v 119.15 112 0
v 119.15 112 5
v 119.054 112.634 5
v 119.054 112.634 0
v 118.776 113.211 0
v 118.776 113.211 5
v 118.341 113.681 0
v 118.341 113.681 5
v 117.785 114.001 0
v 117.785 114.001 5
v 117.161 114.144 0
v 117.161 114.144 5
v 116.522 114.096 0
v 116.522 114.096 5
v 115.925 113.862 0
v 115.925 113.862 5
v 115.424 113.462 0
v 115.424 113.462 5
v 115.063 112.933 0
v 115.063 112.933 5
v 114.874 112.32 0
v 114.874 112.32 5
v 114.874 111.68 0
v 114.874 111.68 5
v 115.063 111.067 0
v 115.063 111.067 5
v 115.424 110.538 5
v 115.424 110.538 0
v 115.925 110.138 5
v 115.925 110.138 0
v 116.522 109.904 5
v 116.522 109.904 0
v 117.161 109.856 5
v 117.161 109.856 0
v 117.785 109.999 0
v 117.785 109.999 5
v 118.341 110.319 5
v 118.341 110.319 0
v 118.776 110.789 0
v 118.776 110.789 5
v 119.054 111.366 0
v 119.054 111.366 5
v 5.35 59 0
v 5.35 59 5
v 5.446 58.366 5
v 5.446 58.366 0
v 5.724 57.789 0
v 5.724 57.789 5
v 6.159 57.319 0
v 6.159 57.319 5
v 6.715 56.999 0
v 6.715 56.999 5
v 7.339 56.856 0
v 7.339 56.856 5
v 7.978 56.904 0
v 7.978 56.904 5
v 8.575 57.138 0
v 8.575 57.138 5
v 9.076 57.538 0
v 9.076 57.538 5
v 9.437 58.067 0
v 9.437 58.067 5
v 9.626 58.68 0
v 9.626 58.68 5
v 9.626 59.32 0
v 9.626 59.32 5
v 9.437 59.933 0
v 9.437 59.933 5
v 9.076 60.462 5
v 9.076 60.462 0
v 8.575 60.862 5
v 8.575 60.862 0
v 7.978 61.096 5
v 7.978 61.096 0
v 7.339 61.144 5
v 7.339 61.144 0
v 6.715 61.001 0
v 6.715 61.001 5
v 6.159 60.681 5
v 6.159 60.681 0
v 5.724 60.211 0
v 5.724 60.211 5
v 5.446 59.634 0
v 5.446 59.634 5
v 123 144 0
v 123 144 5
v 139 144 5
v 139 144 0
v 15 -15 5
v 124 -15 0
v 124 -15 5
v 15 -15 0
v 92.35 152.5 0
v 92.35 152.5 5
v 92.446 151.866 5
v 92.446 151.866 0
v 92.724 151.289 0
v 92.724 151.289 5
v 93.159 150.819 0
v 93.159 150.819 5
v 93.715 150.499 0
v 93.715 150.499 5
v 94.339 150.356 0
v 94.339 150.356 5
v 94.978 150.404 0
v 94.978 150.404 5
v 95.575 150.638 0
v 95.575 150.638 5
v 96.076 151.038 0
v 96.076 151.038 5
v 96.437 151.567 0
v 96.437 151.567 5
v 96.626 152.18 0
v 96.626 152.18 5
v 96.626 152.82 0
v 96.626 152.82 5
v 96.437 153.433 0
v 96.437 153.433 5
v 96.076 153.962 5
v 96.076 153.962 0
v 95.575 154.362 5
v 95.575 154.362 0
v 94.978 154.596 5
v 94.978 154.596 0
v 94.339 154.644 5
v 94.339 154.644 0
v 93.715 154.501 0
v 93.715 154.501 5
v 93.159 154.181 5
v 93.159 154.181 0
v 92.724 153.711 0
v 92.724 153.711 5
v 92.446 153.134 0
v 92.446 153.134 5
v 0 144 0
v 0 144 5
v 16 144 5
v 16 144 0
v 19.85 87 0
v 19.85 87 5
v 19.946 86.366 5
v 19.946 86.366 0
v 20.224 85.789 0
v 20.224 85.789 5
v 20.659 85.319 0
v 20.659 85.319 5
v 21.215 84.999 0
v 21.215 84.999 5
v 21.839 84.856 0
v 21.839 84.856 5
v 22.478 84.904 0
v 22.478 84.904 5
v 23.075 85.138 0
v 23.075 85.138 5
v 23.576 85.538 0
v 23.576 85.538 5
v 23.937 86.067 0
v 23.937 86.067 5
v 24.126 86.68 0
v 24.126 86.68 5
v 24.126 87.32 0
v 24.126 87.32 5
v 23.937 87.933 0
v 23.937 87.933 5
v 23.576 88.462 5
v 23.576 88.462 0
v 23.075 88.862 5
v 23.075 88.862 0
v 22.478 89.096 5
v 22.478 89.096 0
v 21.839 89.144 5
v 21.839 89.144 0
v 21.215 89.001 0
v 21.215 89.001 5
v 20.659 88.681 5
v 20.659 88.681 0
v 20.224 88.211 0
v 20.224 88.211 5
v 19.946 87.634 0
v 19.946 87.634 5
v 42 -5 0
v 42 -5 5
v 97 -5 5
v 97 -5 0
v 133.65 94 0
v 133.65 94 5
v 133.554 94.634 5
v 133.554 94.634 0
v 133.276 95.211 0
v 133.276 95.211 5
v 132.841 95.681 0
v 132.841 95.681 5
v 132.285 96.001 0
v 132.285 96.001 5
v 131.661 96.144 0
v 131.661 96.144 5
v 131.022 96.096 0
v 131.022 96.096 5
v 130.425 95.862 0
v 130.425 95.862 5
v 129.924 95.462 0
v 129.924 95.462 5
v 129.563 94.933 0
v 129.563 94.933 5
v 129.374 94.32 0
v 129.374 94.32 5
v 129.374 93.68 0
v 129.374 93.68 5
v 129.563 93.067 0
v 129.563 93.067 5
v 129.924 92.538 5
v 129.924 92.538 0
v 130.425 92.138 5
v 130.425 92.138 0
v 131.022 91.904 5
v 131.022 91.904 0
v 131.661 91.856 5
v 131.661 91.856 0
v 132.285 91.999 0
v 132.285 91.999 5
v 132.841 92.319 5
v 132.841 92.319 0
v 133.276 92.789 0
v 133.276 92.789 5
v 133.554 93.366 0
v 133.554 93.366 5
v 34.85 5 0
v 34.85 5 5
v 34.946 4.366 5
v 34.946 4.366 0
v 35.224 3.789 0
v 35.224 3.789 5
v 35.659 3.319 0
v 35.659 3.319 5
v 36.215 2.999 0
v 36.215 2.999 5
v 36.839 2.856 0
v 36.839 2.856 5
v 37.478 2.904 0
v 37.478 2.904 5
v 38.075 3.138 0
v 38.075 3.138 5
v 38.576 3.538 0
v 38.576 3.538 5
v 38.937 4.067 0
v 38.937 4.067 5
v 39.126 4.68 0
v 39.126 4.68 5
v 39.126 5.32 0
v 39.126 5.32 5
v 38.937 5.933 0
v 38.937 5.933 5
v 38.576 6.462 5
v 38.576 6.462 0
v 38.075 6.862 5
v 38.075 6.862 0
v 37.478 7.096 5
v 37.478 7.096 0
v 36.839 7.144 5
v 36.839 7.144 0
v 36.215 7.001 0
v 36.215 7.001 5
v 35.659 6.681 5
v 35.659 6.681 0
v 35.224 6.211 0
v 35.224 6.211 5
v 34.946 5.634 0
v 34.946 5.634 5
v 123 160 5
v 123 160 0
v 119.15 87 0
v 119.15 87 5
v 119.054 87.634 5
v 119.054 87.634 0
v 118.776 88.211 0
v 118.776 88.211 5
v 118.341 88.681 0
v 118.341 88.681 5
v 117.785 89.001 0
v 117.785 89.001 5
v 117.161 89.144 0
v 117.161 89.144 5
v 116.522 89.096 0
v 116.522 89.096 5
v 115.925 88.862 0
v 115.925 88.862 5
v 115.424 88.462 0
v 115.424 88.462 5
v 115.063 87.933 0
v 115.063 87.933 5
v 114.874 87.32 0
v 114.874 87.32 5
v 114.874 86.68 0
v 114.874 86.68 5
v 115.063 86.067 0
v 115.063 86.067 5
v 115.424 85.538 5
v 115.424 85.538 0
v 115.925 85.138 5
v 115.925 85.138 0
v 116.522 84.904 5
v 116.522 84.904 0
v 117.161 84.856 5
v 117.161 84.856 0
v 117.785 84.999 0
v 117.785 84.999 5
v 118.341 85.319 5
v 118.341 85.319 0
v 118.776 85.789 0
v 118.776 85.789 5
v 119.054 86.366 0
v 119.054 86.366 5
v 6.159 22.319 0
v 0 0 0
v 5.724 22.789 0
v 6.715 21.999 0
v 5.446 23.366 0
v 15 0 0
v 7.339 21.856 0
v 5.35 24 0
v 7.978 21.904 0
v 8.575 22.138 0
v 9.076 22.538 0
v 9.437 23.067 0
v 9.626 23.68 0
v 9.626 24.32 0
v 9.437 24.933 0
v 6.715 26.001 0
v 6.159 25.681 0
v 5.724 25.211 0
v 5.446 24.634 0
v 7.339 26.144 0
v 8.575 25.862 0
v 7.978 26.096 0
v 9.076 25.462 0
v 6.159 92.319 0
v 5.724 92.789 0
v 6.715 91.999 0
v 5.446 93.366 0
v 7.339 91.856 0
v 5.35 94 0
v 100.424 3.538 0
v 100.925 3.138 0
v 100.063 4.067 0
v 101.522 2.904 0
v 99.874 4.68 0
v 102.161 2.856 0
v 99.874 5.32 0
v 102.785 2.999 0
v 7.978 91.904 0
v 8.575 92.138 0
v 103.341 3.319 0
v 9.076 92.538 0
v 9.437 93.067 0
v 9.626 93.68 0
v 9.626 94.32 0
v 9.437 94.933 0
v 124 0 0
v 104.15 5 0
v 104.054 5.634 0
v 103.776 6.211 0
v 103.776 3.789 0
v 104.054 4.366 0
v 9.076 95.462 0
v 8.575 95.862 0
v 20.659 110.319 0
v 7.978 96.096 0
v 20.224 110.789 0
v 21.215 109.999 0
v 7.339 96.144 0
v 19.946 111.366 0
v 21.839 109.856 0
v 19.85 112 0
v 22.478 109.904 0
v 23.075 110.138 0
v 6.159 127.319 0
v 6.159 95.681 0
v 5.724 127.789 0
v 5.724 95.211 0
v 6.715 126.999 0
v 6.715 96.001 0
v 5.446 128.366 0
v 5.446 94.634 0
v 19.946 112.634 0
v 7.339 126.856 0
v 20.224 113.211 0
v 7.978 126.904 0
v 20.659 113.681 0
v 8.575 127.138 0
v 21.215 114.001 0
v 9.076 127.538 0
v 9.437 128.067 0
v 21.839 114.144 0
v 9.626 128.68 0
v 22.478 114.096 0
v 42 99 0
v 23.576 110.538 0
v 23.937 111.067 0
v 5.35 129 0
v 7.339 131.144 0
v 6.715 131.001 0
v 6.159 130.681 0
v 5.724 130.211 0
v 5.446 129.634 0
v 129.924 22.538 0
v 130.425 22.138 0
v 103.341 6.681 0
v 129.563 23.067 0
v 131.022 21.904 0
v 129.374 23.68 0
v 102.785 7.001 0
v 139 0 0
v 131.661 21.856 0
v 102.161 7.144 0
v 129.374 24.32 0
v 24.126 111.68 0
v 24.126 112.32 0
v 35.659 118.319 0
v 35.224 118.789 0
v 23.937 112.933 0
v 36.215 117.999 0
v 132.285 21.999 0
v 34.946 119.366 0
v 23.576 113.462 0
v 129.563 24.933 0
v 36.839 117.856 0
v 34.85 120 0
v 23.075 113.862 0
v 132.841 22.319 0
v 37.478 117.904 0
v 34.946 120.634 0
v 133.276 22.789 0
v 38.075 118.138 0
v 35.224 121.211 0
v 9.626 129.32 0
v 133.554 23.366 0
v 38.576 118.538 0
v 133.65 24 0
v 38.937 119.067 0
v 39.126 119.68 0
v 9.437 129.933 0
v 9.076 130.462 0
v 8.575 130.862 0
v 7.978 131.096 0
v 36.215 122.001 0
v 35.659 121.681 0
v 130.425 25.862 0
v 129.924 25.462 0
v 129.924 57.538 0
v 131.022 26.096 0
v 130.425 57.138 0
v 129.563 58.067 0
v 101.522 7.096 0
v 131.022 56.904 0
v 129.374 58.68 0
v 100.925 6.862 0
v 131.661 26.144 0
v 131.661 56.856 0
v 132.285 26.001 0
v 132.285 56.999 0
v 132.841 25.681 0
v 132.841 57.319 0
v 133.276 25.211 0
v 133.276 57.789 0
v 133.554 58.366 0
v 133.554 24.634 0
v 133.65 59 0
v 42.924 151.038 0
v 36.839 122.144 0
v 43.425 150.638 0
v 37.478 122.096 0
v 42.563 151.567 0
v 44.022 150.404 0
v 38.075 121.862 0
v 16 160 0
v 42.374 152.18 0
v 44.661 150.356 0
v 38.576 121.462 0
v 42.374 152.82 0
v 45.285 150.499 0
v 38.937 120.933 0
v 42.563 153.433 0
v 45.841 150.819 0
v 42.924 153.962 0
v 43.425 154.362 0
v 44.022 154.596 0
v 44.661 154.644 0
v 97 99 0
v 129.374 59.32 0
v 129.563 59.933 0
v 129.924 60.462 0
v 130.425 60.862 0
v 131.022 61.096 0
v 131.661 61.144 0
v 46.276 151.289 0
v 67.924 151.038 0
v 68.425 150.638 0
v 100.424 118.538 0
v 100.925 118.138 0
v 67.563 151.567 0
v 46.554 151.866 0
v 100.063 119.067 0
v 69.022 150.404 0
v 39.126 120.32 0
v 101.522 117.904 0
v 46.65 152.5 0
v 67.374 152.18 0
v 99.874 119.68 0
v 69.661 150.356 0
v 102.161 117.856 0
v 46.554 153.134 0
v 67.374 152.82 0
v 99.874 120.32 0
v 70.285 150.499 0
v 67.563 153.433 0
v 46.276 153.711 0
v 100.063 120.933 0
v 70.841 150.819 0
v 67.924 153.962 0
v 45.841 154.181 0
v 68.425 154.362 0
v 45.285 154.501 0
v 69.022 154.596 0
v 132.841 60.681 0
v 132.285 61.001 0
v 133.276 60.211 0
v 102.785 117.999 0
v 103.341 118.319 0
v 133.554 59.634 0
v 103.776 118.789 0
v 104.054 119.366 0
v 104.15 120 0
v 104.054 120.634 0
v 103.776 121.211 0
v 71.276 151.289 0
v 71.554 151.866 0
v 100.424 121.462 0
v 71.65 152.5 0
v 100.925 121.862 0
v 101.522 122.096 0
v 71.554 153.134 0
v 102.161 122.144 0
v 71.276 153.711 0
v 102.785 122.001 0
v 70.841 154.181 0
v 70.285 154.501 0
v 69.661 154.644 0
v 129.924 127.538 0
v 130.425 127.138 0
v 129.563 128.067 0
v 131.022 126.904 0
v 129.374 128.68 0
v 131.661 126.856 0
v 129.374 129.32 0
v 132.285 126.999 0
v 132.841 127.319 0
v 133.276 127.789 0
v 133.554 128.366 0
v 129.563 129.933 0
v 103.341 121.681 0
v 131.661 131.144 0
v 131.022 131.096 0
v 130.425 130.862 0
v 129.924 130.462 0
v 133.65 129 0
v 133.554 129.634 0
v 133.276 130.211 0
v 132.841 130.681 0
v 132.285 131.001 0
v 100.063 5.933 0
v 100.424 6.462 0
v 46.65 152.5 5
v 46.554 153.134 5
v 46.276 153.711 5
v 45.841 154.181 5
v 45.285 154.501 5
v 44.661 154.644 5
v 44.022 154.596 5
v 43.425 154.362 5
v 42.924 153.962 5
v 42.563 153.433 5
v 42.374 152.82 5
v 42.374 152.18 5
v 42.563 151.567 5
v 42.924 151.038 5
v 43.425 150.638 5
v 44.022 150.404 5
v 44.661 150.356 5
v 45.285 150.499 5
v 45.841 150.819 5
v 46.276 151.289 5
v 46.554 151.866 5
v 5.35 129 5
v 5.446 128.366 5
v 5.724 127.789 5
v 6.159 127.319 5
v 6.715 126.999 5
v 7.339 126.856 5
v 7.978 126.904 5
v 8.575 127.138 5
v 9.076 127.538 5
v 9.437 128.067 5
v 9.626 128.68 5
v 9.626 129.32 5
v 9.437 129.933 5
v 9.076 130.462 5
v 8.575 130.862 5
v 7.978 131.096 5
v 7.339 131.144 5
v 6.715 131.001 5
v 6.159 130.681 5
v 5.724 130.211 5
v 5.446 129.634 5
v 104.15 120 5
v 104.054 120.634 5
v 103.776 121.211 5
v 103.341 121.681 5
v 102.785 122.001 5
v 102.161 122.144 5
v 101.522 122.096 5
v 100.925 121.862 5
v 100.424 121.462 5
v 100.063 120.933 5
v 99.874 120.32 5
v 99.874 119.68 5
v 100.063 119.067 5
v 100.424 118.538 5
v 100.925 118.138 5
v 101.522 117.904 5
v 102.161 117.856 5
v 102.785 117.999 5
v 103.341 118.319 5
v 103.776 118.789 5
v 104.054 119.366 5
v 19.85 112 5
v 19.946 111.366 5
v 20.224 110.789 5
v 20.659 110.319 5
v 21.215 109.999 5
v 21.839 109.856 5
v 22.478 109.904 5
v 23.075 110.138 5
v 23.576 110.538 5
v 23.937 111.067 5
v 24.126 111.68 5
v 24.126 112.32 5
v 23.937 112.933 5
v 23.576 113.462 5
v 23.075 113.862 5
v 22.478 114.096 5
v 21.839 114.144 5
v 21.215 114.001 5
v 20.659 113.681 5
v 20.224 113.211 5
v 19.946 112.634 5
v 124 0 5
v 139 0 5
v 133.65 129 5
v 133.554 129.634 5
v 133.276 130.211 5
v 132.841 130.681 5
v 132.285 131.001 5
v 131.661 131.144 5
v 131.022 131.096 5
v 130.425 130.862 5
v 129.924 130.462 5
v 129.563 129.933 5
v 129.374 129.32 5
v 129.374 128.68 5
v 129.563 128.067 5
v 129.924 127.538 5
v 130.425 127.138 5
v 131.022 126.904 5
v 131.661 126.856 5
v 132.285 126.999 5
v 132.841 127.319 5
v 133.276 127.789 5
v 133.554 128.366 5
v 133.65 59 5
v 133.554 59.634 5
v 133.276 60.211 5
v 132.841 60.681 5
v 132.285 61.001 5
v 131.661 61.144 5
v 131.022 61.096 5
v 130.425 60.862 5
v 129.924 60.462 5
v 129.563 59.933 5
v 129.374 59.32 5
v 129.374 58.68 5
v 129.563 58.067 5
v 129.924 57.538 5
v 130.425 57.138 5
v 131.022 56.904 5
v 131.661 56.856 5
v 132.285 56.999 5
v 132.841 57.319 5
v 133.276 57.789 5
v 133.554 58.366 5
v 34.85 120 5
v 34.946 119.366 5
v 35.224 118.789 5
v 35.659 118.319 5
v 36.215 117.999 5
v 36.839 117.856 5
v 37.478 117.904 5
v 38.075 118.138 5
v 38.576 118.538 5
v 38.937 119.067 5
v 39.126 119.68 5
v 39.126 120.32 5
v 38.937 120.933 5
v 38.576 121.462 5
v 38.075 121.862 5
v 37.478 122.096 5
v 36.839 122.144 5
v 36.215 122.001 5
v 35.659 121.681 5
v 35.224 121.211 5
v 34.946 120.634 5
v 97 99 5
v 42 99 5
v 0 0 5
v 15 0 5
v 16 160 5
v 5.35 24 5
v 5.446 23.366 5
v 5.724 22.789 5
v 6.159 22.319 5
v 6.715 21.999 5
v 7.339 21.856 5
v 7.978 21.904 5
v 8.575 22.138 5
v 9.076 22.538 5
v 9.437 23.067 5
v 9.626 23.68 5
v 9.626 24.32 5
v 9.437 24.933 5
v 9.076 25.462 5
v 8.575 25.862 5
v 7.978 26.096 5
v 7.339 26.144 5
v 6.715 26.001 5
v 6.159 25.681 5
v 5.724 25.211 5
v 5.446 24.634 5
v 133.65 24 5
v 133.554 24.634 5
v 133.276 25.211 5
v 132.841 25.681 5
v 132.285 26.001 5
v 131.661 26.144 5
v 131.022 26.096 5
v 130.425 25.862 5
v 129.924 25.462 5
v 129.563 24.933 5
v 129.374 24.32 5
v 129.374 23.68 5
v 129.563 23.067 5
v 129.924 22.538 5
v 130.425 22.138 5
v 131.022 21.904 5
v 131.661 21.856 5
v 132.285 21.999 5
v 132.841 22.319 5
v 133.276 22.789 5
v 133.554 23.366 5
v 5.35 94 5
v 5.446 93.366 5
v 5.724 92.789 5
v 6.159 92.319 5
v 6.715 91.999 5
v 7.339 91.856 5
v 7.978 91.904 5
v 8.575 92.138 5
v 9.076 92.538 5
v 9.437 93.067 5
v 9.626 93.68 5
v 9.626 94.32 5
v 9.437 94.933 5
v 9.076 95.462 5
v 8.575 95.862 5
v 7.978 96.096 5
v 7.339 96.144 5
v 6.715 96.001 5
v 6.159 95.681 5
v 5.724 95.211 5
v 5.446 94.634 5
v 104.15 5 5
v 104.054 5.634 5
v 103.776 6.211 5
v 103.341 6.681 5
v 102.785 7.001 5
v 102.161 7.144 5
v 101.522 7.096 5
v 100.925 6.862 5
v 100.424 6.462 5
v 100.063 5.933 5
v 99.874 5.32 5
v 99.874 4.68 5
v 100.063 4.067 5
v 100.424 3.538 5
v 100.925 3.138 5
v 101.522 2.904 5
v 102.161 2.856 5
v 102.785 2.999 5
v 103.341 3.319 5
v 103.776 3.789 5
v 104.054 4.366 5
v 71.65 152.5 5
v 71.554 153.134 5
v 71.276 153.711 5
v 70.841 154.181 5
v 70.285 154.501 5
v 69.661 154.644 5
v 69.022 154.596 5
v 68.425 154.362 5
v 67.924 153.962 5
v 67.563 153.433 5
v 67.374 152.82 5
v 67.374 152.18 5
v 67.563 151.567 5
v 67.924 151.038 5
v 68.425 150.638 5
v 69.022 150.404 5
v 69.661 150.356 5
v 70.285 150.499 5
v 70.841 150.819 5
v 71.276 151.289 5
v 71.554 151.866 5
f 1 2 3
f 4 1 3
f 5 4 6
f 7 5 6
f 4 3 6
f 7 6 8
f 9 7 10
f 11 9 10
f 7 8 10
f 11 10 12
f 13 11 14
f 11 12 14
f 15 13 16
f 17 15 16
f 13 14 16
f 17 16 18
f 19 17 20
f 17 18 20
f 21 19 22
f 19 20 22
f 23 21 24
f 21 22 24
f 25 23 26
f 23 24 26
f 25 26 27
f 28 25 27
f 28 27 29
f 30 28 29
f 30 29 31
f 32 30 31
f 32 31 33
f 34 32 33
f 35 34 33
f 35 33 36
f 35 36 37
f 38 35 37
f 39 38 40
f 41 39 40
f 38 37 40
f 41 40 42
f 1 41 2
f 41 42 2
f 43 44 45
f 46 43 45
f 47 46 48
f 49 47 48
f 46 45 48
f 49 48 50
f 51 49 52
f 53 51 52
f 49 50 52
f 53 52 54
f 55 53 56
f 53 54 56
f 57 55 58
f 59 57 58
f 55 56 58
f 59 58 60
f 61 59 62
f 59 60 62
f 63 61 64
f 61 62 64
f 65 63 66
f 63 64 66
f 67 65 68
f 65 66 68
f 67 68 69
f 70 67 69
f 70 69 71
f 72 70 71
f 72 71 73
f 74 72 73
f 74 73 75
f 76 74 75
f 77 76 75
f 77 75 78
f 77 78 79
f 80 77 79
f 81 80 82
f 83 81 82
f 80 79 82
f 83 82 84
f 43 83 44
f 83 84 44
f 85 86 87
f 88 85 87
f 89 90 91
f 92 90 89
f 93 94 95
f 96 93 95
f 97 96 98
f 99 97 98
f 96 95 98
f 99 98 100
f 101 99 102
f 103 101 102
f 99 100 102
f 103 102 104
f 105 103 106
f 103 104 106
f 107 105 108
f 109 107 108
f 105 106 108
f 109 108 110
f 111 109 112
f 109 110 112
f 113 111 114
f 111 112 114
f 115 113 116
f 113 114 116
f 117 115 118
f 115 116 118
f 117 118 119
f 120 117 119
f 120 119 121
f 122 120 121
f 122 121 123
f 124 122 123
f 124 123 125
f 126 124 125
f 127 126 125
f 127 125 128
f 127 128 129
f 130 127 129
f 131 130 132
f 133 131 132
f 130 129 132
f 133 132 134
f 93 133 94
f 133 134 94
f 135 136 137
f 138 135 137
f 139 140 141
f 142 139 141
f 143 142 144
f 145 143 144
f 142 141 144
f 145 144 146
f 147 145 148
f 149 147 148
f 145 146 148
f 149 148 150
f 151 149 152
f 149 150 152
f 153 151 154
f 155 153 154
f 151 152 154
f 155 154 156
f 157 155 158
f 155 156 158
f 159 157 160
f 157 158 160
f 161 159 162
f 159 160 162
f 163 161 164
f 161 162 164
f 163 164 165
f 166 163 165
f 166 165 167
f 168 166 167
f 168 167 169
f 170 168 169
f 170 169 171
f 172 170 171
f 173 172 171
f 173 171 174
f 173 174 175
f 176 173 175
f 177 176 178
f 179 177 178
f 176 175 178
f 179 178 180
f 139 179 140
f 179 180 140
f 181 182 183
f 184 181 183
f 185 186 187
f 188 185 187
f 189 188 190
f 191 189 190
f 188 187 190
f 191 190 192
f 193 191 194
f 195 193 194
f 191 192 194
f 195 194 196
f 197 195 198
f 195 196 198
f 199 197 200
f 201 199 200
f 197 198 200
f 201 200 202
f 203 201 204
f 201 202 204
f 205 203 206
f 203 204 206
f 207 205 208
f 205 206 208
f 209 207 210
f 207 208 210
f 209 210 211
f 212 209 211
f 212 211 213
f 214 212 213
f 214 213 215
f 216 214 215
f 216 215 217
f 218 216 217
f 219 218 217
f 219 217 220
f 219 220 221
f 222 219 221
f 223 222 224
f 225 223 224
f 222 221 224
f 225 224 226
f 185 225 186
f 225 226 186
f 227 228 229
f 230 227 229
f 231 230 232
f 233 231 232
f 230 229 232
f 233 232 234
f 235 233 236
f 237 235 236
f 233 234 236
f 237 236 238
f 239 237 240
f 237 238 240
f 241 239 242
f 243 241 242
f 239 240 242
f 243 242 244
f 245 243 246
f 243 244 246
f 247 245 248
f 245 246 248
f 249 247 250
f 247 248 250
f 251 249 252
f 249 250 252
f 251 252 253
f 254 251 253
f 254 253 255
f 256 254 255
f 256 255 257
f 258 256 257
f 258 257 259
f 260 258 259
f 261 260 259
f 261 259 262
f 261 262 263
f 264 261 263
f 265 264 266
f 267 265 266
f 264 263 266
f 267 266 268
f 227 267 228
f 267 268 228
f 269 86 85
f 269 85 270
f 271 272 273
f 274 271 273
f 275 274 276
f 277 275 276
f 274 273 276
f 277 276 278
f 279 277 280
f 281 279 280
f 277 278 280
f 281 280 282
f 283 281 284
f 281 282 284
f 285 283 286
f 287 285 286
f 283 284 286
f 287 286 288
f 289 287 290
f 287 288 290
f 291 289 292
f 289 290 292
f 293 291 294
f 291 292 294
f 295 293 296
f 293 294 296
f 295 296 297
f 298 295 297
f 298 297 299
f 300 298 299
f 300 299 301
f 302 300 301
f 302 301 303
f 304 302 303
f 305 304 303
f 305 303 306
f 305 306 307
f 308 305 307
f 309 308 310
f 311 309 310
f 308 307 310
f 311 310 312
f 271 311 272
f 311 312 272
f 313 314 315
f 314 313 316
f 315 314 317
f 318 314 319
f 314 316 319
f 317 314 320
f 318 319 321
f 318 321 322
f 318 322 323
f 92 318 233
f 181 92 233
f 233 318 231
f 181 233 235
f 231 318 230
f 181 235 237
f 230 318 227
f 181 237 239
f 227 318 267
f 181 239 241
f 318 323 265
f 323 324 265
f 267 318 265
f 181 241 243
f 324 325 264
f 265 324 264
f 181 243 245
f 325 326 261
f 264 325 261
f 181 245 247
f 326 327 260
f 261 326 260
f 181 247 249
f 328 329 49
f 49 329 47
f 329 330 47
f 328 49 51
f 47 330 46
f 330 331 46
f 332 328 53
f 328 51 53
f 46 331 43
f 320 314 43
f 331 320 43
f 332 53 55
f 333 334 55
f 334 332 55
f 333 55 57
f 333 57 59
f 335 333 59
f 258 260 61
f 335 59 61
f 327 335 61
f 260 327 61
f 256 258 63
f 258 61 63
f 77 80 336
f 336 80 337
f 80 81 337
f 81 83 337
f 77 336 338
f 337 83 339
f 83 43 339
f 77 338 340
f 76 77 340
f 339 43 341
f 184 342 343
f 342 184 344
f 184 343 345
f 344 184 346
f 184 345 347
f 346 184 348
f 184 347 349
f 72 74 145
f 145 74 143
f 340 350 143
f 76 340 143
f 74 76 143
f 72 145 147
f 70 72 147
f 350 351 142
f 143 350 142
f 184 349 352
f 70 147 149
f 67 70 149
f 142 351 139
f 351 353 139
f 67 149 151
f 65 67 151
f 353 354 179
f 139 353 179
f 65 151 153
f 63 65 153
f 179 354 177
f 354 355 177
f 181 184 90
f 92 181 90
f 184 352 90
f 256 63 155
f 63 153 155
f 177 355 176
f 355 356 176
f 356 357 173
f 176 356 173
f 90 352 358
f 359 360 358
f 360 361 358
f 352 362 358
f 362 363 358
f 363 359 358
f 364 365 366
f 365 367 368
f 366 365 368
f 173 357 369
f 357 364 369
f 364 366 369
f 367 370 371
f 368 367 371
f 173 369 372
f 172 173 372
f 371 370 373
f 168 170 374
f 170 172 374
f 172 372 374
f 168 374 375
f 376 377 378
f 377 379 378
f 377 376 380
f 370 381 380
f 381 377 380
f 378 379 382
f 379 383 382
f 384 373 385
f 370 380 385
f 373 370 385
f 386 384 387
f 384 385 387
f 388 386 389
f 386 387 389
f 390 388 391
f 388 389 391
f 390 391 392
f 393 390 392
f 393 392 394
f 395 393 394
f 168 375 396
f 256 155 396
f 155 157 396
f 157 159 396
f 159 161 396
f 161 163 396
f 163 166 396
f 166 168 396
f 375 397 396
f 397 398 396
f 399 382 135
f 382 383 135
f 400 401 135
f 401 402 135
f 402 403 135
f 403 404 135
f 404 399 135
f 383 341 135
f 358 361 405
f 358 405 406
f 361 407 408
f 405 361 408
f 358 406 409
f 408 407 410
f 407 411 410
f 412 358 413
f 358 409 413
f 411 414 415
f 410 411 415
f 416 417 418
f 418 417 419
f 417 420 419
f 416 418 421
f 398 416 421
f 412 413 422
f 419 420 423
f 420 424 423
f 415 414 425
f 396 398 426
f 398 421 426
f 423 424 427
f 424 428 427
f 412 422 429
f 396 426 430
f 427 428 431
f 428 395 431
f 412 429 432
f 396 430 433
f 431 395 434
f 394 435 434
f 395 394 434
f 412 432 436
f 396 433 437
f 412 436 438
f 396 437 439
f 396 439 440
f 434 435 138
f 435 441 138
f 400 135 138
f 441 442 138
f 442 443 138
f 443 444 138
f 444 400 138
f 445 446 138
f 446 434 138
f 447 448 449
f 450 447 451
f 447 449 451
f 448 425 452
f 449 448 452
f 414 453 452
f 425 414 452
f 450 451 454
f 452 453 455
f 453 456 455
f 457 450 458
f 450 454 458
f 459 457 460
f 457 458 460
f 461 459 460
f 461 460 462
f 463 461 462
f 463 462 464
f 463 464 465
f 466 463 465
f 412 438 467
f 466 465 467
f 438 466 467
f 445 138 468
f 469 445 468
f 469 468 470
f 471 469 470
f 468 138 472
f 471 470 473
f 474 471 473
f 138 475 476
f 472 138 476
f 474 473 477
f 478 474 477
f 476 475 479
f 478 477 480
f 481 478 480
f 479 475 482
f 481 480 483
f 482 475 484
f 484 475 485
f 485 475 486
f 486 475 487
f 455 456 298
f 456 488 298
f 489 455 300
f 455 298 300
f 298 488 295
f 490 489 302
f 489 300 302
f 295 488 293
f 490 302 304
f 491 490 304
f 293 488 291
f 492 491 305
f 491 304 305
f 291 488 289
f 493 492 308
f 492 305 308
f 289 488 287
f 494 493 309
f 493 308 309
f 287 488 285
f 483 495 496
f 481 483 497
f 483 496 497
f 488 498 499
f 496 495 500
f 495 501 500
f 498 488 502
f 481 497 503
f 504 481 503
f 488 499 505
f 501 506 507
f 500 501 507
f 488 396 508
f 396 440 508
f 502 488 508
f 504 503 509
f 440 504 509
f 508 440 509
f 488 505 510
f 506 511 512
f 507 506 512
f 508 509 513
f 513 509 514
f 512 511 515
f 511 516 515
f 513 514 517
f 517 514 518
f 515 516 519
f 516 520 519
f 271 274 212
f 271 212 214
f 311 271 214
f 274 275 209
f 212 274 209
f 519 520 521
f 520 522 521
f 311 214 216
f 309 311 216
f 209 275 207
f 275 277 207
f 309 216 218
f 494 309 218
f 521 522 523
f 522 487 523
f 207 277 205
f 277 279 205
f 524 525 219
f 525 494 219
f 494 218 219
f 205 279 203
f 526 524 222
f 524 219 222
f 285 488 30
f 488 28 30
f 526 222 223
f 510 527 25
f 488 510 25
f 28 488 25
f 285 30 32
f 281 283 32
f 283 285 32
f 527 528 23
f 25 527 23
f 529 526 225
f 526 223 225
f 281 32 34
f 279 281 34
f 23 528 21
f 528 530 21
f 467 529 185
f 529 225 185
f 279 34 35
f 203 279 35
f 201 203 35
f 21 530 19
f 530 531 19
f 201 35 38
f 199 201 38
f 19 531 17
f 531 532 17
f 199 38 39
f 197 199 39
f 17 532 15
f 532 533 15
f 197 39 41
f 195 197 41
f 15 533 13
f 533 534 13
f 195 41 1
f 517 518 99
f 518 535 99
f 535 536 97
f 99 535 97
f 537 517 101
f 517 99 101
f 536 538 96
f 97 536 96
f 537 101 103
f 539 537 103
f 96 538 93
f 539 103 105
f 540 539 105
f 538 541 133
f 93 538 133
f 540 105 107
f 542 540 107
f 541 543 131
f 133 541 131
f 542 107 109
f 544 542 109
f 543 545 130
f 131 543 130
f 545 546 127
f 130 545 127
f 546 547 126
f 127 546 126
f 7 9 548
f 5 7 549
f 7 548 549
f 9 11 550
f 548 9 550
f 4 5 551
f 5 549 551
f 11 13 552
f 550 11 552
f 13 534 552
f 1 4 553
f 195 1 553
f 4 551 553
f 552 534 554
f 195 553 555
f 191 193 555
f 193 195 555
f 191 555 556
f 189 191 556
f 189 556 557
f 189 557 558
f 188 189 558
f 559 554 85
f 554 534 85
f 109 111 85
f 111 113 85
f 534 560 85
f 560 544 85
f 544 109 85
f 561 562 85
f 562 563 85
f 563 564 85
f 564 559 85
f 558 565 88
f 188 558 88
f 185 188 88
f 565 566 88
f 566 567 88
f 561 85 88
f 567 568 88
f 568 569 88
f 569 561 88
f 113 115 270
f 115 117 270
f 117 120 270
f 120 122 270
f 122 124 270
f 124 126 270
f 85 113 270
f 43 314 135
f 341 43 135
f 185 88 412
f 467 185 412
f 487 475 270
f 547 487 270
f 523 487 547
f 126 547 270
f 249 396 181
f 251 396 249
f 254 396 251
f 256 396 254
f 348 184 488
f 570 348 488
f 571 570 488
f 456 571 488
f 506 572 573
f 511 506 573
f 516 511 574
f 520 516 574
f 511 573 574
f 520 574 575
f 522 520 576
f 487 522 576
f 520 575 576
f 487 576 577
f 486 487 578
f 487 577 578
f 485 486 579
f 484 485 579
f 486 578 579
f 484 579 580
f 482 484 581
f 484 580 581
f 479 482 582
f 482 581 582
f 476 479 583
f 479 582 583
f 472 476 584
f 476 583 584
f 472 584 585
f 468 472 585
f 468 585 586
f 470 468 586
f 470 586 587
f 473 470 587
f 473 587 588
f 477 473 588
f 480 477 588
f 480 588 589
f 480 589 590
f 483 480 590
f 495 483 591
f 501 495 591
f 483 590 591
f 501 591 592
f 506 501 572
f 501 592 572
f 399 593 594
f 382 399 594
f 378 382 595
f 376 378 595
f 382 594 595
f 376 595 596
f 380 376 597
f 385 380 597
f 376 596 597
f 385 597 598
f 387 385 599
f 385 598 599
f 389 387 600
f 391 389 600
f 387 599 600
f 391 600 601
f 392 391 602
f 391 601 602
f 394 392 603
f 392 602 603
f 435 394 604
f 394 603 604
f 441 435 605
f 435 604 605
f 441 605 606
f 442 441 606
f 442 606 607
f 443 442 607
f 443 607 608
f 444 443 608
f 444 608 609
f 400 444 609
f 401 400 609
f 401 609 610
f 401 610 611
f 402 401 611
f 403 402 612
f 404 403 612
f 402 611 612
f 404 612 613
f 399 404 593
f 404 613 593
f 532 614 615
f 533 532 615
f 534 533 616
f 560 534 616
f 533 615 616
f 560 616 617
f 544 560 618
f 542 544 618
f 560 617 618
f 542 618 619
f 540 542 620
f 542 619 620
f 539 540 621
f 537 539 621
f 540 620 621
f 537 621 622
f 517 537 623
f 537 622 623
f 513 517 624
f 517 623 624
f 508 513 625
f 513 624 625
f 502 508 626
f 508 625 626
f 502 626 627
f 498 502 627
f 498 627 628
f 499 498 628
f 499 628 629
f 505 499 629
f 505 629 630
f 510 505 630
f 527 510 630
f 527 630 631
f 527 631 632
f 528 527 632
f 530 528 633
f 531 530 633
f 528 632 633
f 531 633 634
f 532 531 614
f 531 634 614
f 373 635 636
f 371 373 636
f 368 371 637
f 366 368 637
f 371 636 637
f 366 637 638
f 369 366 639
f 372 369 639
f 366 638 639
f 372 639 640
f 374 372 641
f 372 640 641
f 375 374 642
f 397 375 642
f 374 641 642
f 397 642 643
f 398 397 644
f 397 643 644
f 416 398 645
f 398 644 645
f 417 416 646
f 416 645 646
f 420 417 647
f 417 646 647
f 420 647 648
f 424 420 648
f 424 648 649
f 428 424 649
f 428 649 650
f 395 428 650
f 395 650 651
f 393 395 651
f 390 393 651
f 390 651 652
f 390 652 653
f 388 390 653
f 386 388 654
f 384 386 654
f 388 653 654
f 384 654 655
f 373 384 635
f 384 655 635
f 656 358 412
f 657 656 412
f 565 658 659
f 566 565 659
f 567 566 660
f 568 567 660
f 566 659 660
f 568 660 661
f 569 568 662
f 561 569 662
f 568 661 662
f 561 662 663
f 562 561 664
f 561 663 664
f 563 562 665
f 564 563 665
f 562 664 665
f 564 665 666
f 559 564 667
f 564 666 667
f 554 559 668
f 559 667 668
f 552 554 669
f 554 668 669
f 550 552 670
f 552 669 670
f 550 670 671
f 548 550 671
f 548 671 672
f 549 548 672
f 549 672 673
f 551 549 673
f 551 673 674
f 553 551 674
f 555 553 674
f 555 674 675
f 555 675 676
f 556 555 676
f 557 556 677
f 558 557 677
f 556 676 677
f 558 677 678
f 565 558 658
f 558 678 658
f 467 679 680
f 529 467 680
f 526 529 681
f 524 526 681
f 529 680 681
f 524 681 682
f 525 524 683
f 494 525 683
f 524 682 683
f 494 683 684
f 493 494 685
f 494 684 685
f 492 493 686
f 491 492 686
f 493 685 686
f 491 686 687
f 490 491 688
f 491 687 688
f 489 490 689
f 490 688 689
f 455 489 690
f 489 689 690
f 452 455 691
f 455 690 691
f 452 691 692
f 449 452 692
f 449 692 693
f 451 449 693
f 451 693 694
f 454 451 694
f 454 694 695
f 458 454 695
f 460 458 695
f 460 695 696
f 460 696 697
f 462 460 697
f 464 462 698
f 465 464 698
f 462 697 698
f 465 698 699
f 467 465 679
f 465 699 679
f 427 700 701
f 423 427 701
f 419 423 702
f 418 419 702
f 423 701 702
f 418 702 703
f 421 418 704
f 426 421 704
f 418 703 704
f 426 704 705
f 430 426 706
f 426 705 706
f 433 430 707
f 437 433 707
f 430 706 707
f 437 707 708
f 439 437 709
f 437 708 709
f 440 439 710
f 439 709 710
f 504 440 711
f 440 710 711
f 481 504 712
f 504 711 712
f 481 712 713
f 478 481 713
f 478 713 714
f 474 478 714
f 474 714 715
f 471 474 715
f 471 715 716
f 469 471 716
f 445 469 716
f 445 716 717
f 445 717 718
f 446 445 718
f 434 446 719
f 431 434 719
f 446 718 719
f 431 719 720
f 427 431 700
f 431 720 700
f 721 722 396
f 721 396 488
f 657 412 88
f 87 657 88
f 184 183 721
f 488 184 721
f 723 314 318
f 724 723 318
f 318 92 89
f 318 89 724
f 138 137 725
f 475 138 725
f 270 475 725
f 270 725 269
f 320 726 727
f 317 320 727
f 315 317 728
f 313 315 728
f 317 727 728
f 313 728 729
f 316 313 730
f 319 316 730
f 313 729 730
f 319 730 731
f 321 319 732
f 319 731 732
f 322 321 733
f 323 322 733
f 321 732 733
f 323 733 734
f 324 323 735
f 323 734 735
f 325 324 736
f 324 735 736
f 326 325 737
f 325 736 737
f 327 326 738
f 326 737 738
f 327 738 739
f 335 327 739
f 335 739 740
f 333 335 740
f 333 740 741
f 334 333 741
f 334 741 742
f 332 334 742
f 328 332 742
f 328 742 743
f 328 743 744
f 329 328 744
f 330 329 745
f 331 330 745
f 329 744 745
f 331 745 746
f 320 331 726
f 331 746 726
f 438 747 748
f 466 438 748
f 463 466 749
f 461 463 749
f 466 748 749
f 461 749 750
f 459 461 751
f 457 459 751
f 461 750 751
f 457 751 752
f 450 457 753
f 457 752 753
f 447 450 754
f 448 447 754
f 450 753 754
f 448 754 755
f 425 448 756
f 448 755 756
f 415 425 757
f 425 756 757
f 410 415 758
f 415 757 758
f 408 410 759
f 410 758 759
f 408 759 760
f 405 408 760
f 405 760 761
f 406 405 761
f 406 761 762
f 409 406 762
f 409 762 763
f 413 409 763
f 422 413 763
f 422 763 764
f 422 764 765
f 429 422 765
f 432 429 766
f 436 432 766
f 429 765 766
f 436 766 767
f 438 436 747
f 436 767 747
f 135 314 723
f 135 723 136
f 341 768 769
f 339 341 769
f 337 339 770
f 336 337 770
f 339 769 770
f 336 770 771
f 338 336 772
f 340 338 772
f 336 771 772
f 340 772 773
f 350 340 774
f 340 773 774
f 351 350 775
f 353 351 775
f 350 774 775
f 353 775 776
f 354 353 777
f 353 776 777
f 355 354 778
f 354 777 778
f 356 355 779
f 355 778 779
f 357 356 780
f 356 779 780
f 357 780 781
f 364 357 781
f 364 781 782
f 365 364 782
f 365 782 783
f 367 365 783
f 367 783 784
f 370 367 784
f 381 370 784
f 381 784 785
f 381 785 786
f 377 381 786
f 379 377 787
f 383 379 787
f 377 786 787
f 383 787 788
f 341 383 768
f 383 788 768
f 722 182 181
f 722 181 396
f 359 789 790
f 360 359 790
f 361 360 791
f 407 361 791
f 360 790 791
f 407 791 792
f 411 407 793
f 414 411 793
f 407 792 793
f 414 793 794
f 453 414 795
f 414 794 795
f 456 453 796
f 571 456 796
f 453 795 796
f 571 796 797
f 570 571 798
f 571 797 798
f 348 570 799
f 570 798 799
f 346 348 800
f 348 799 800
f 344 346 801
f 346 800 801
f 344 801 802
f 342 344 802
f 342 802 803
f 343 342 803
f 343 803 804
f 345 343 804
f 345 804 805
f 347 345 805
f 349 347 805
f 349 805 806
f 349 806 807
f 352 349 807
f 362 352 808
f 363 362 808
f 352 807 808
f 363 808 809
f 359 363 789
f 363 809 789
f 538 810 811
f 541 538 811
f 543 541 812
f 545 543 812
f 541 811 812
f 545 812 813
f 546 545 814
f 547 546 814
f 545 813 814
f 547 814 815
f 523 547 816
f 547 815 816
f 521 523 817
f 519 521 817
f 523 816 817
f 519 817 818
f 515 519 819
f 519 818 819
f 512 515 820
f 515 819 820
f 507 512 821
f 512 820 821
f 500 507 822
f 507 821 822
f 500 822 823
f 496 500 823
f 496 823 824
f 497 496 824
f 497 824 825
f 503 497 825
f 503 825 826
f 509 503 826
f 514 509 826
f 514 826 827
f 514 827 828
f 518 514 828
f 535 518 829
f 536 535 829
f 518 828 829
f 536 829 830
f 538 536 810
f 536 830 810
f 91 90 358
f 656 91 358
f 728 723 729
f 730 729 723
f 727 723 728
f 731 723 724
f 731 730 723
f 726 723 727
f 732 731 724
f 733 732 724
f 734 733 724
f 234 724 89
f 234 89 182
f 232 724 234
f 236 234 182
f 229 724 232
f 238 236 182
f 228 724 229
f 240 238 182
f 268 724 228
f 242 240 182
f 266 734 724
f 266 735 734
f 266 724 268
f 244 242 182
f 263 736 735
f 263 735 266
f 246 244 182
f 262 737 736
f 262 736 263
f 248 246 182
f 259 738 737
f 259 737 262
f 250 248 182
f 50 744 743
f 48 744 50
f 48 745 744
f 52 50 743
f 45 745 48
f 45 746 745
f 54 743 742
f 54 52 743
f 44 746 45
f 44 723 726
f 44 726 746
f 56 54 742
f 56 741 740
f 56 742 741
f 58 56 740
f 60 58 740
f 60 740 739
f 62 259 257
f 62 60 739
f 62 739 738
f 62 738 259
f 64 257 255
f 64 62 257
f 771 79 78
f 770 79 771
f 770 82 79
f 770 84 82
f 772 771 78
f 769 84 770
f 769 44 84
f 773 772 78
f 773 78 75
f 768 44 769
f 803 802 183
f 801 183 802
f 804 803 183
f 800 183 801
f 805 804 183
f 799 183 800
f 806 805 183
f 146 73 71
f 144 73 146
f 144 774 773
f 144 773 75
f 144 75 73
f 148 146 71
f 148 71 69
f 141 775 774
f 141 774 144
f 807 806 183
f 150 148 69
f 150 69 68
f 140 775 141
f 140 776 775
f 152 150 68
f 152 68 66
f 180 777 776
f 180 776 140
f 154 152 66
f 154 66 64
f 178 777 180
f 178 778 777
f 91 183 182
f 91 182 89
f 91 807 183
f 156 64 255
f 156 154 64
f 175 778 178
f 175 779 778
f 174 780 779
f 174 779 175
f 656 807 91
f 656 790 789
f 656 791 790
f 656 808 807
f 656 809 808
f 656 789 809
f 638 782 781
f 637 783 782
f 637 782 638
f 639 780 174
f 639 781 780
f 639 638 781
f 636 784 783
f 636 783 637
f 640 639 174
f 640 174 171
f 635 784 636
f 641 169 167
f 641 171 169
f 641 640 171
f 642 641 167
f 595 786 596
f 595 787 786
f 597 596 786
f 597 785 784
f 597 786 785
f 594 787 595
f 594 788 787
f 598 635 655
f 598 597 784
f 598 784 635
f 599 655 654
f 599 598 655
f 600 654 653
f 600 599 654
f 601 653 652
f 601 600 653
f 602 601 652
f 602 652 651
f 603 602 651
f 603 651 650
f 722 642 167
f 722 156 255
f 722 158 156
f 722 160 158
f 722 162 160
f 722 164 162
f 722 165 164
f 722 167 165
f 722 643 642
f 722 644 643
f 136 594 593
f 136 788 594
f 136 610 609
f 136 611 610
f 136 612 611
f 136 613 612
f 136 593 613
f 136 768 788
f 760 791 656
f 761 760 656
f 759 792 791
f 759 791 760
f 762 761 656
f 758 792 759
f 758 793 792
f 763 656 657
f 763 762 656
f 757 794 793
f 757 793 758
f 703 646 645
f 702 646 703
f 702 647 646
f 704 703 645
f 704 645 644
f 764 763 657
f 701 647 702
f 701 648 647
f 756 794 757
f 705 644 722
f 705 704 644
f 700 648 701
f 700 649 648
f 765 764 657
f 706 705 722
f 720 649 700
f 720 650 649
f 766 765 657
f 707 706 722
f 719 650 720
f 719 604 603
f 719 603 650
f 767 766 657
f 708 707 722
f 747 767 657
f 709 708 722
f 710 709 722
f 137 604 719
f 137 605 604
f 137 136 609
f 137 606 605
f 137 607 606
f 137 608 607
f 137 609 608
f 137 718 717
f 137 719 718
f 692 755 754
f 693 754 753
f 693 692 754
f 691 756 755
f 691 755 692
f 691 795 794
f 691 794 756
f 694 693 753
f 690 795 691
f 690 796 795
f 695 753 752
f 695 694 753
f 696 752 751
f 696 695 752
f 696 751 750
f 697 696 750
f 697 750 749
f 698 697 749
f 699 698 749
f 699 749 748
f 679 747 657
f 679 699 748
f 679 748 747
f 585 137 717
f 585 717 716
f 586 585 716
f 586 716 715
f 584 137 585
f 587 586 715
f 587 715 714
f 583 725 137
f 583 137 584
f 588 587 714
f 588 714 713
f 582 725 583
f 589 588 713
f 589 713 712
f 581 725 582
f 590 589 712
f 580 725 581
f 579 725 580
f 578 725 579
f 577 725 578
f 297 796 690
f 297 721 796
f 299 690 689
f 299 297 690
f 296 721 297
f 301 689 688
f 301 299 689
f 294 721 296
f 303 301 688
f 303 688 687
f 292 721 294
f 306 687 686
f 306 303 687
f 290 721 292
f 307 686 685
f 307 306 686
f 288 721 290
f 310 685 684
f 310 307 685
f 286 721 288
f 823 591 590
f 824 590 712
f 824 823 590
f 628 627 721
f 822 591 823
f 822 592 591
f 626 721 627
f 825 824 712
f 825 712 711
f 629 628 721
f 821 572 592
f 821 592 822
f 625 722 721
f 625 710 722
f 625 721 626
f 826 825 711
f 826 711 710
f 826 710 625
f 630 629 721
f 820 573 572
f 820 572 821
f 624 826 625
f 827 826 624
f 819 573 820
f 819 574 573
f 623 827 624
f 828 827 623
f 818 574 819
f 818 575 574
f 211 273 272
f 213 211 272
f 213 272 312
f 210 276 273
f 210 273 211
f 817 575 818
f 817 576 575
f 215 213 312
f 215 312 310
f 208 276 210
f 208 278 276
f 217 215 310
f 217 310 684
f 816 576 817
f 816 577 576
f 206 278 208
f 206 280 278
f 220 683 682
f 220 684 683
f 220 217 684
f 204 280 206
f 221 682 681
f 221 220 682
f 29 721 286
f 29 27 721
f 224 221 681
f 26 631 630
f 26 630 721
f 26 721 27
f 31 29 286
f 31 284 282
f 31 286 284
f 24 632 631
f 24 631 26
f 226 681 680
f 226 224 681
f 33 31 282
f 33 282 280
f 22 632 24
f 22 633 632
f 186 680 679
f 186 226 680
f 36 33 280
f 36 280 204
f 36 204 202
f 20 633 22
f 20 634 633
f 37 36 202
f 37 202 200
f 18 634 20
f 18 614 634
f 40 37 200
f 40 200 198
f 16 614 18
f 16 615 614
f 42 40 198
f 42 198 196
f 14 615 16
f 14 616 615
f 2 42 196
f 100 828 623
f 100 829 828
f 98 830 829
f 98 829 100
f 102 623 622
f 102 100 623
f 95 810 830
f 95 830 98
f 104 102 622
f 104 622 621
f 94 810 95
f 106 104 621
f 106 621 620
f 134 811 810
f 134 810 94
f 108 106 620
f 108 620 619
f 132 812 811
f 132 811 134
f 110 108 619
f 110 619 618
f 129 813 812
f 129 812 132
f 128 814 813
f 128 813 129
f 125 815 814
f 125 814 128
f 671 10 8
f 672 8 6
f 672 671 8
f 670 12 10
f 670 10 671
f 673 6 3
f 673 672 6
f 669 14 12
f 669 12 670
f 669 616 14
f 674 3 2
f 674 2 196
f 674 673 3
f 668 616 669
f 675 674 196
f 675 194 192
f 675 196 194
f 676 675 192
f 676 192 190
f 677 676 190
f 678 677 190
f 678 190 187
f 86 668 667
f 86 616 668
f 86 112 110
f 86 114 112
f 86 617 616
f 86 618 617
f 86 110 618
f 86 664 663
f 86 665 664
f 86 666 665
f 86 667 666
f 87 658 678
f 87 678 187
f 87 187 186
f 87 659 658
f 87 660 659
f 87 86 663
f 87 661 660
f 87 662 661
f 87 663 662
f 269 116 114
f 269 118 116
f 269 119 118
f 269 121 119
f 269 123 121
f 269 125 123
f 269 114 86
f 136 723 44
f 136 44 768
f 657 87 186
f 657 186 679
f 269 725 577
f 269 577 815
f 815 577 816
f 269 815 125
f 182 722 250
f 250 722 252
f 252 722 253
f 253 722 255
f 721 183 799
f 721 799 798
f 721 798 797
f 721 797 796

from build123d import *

# Parameters (mm, degrees)
SKETCH1_W           = 139
SKETCH1_H           = 160
BOSS_EXTRUDE1_DEPTH = 5
SKETCH2_W           = 16
SKETCH2_H           = 16
CUT_EXTRUDE1_DEPTH  = 5
SKETCH3_R           = 2.15
CUT_EXTRUDE2_DEPTH  = 5
SKETCH4_R           = 2.15
CUT_EXTRUDE3_DEPTH  = 5
LPATTERN1_COUNT     = 4
LPATTERN1_PITCH     = 35
SKETCH5_R           = 2.15
CUT_EXTRUDE4_DEPTH  = 5
SKETCH6_W           = 109
SKETCH6_H           = 15
BOSS_EXTRUDE2_DEPTH = 5
SKETCH7_W           = 55
SKETCH7_H           = 104
CUT_EXTRUDE5_DEPTH  = 5
SKETCH8_R           = 2.15
CUT_EXTRUDE6_DEPTH  = 5


with BuildPart() as part:
    # Sketch1 → Boss-Extrude1 (new body)
    with BuildSketch(Plane.XY):
        with Locations((69.5, 80)):
            Rectangle(SKETCH1_W, SKETCH1_H)
    extrude(amount=BOSS_EXTRUDE1_DEPTH)

    # Sketch2 → Cut-Extrude1 (cut)
    with BuildSketch(Plane.XY.offset(5)):
        with Locations((131, 152)):
            Rectangle(SKETCH2_W, SKETCH2_H)
        with Locations((8, 152)):
            Rectangle(SKETCH2_W, SKETCH2_H)
    extrude(amount=-CUT_EXTRUDE1_DEPTH, mode=Mode.SUBTRACT)

    # Sketch3 → Cut-Extrude2 (cut)
    with BuildSketch(Plane.XY.offset(5)):
        with Locations((69.5, 152.5)):
            Circle(SKETCH3_R)
        with Locations((44.5, 152.5)):
            Circle(SKETCH3_R)
        with Locations(Location((94.5, 152.5, 0), (0, 0, 180))):
            Circle(SKETCH3_R)
    extrude(amount=-CUT_EXTRUDE2_DEPTH, mode=Mode.SUBTRACT)

    # Sketch4 → Cut-Extrude3 (cut)
    with BuildSketch(Plane.XY.offset(5)):
        with Locations((131.5, 129)):
            Circle(SKETCH4_R)
        with Locations(Location((7.5, 129, 0), (0, 0, 180))):
            Circle(SKETCH4_R)
    cut_extrude3 = extrude(amount=-CUT_EXTRUDE3_DEPTH, mode=Mode.SUBTRACT)

    # LPattern1: Cut-Extrude3 ×4
    with Locations(*[(0, -i * LPATTERN1_PITCH, 0) for i in range(1, LPATTERN1_COUNT)]):
        add(cut_extrude3, mode=Mode.SUBTRACT)

    # Sketch5 → Cut-Extrude4 (cut)
    with BuildSketch(Plane.XY.offset(5)):
        with Locations((117, 112)):
            Circle(SKETCH5_R)
        with Locations((117, 87)):
            Circle(SKETCH5_R)
        with Locations(Location((22, 87, 0), (0, 0, 180))):
            Circle(SKETCH5_R)
        with Locations(Location((22, 112, 0), (0, 0, 180))):
            Circle(SKETCH5_R)
    extrude(amount=-CUT_EXTRUDE4_DEPTH, mode=Mode.SUBTRACT)

    # Sketch6 → Boss-Extrude2 (add)
    with BuildSketch(Plane(origin=(0, 0, 0), x_dir=(-1, 0, 0), z_dir=(0, 0, -1))):
        with Locations((-69.5, -7.5)):
            Rectangle(SKETCH6_W, SKETCH6_H)
    extrude(amount=-BOSS_EXTRUDE2_DEPTH)

    # Sketch7 → Cut-Extrude5 (cut)
    with BuildSketch(Plane.XY.offset(5)):
        with Locations((69.5, 47)):
            Rectangle(SKETCH7_W, SKETCH7_H)
    extrude(amount=-CUT_EXTRUDE5_DEPTH, mode=Mode.SUBTRACT)

    # Sketch8 → Cut-Extrude6 (cut)
    with BuildSketch(Plane.XY.offset(5)):
        with Locations((102, 5)):
            Circle(SKETCH8_R)
        with Locations((102, 120)):
            Circle(SKETCH8_R)
        with Locations(Location((37, 120, 0), (0, 0, 180))):
            Circle(SKETCH8_R)
        with Locations(Location((37, 5, 0), (0, 0, 180))):
            Circle(SKETCH8_R)
    extrude(amount=-CUT_EXTRUDE6_DEPTH, mode=Mode.SUBTRACT)


solid = part.part
